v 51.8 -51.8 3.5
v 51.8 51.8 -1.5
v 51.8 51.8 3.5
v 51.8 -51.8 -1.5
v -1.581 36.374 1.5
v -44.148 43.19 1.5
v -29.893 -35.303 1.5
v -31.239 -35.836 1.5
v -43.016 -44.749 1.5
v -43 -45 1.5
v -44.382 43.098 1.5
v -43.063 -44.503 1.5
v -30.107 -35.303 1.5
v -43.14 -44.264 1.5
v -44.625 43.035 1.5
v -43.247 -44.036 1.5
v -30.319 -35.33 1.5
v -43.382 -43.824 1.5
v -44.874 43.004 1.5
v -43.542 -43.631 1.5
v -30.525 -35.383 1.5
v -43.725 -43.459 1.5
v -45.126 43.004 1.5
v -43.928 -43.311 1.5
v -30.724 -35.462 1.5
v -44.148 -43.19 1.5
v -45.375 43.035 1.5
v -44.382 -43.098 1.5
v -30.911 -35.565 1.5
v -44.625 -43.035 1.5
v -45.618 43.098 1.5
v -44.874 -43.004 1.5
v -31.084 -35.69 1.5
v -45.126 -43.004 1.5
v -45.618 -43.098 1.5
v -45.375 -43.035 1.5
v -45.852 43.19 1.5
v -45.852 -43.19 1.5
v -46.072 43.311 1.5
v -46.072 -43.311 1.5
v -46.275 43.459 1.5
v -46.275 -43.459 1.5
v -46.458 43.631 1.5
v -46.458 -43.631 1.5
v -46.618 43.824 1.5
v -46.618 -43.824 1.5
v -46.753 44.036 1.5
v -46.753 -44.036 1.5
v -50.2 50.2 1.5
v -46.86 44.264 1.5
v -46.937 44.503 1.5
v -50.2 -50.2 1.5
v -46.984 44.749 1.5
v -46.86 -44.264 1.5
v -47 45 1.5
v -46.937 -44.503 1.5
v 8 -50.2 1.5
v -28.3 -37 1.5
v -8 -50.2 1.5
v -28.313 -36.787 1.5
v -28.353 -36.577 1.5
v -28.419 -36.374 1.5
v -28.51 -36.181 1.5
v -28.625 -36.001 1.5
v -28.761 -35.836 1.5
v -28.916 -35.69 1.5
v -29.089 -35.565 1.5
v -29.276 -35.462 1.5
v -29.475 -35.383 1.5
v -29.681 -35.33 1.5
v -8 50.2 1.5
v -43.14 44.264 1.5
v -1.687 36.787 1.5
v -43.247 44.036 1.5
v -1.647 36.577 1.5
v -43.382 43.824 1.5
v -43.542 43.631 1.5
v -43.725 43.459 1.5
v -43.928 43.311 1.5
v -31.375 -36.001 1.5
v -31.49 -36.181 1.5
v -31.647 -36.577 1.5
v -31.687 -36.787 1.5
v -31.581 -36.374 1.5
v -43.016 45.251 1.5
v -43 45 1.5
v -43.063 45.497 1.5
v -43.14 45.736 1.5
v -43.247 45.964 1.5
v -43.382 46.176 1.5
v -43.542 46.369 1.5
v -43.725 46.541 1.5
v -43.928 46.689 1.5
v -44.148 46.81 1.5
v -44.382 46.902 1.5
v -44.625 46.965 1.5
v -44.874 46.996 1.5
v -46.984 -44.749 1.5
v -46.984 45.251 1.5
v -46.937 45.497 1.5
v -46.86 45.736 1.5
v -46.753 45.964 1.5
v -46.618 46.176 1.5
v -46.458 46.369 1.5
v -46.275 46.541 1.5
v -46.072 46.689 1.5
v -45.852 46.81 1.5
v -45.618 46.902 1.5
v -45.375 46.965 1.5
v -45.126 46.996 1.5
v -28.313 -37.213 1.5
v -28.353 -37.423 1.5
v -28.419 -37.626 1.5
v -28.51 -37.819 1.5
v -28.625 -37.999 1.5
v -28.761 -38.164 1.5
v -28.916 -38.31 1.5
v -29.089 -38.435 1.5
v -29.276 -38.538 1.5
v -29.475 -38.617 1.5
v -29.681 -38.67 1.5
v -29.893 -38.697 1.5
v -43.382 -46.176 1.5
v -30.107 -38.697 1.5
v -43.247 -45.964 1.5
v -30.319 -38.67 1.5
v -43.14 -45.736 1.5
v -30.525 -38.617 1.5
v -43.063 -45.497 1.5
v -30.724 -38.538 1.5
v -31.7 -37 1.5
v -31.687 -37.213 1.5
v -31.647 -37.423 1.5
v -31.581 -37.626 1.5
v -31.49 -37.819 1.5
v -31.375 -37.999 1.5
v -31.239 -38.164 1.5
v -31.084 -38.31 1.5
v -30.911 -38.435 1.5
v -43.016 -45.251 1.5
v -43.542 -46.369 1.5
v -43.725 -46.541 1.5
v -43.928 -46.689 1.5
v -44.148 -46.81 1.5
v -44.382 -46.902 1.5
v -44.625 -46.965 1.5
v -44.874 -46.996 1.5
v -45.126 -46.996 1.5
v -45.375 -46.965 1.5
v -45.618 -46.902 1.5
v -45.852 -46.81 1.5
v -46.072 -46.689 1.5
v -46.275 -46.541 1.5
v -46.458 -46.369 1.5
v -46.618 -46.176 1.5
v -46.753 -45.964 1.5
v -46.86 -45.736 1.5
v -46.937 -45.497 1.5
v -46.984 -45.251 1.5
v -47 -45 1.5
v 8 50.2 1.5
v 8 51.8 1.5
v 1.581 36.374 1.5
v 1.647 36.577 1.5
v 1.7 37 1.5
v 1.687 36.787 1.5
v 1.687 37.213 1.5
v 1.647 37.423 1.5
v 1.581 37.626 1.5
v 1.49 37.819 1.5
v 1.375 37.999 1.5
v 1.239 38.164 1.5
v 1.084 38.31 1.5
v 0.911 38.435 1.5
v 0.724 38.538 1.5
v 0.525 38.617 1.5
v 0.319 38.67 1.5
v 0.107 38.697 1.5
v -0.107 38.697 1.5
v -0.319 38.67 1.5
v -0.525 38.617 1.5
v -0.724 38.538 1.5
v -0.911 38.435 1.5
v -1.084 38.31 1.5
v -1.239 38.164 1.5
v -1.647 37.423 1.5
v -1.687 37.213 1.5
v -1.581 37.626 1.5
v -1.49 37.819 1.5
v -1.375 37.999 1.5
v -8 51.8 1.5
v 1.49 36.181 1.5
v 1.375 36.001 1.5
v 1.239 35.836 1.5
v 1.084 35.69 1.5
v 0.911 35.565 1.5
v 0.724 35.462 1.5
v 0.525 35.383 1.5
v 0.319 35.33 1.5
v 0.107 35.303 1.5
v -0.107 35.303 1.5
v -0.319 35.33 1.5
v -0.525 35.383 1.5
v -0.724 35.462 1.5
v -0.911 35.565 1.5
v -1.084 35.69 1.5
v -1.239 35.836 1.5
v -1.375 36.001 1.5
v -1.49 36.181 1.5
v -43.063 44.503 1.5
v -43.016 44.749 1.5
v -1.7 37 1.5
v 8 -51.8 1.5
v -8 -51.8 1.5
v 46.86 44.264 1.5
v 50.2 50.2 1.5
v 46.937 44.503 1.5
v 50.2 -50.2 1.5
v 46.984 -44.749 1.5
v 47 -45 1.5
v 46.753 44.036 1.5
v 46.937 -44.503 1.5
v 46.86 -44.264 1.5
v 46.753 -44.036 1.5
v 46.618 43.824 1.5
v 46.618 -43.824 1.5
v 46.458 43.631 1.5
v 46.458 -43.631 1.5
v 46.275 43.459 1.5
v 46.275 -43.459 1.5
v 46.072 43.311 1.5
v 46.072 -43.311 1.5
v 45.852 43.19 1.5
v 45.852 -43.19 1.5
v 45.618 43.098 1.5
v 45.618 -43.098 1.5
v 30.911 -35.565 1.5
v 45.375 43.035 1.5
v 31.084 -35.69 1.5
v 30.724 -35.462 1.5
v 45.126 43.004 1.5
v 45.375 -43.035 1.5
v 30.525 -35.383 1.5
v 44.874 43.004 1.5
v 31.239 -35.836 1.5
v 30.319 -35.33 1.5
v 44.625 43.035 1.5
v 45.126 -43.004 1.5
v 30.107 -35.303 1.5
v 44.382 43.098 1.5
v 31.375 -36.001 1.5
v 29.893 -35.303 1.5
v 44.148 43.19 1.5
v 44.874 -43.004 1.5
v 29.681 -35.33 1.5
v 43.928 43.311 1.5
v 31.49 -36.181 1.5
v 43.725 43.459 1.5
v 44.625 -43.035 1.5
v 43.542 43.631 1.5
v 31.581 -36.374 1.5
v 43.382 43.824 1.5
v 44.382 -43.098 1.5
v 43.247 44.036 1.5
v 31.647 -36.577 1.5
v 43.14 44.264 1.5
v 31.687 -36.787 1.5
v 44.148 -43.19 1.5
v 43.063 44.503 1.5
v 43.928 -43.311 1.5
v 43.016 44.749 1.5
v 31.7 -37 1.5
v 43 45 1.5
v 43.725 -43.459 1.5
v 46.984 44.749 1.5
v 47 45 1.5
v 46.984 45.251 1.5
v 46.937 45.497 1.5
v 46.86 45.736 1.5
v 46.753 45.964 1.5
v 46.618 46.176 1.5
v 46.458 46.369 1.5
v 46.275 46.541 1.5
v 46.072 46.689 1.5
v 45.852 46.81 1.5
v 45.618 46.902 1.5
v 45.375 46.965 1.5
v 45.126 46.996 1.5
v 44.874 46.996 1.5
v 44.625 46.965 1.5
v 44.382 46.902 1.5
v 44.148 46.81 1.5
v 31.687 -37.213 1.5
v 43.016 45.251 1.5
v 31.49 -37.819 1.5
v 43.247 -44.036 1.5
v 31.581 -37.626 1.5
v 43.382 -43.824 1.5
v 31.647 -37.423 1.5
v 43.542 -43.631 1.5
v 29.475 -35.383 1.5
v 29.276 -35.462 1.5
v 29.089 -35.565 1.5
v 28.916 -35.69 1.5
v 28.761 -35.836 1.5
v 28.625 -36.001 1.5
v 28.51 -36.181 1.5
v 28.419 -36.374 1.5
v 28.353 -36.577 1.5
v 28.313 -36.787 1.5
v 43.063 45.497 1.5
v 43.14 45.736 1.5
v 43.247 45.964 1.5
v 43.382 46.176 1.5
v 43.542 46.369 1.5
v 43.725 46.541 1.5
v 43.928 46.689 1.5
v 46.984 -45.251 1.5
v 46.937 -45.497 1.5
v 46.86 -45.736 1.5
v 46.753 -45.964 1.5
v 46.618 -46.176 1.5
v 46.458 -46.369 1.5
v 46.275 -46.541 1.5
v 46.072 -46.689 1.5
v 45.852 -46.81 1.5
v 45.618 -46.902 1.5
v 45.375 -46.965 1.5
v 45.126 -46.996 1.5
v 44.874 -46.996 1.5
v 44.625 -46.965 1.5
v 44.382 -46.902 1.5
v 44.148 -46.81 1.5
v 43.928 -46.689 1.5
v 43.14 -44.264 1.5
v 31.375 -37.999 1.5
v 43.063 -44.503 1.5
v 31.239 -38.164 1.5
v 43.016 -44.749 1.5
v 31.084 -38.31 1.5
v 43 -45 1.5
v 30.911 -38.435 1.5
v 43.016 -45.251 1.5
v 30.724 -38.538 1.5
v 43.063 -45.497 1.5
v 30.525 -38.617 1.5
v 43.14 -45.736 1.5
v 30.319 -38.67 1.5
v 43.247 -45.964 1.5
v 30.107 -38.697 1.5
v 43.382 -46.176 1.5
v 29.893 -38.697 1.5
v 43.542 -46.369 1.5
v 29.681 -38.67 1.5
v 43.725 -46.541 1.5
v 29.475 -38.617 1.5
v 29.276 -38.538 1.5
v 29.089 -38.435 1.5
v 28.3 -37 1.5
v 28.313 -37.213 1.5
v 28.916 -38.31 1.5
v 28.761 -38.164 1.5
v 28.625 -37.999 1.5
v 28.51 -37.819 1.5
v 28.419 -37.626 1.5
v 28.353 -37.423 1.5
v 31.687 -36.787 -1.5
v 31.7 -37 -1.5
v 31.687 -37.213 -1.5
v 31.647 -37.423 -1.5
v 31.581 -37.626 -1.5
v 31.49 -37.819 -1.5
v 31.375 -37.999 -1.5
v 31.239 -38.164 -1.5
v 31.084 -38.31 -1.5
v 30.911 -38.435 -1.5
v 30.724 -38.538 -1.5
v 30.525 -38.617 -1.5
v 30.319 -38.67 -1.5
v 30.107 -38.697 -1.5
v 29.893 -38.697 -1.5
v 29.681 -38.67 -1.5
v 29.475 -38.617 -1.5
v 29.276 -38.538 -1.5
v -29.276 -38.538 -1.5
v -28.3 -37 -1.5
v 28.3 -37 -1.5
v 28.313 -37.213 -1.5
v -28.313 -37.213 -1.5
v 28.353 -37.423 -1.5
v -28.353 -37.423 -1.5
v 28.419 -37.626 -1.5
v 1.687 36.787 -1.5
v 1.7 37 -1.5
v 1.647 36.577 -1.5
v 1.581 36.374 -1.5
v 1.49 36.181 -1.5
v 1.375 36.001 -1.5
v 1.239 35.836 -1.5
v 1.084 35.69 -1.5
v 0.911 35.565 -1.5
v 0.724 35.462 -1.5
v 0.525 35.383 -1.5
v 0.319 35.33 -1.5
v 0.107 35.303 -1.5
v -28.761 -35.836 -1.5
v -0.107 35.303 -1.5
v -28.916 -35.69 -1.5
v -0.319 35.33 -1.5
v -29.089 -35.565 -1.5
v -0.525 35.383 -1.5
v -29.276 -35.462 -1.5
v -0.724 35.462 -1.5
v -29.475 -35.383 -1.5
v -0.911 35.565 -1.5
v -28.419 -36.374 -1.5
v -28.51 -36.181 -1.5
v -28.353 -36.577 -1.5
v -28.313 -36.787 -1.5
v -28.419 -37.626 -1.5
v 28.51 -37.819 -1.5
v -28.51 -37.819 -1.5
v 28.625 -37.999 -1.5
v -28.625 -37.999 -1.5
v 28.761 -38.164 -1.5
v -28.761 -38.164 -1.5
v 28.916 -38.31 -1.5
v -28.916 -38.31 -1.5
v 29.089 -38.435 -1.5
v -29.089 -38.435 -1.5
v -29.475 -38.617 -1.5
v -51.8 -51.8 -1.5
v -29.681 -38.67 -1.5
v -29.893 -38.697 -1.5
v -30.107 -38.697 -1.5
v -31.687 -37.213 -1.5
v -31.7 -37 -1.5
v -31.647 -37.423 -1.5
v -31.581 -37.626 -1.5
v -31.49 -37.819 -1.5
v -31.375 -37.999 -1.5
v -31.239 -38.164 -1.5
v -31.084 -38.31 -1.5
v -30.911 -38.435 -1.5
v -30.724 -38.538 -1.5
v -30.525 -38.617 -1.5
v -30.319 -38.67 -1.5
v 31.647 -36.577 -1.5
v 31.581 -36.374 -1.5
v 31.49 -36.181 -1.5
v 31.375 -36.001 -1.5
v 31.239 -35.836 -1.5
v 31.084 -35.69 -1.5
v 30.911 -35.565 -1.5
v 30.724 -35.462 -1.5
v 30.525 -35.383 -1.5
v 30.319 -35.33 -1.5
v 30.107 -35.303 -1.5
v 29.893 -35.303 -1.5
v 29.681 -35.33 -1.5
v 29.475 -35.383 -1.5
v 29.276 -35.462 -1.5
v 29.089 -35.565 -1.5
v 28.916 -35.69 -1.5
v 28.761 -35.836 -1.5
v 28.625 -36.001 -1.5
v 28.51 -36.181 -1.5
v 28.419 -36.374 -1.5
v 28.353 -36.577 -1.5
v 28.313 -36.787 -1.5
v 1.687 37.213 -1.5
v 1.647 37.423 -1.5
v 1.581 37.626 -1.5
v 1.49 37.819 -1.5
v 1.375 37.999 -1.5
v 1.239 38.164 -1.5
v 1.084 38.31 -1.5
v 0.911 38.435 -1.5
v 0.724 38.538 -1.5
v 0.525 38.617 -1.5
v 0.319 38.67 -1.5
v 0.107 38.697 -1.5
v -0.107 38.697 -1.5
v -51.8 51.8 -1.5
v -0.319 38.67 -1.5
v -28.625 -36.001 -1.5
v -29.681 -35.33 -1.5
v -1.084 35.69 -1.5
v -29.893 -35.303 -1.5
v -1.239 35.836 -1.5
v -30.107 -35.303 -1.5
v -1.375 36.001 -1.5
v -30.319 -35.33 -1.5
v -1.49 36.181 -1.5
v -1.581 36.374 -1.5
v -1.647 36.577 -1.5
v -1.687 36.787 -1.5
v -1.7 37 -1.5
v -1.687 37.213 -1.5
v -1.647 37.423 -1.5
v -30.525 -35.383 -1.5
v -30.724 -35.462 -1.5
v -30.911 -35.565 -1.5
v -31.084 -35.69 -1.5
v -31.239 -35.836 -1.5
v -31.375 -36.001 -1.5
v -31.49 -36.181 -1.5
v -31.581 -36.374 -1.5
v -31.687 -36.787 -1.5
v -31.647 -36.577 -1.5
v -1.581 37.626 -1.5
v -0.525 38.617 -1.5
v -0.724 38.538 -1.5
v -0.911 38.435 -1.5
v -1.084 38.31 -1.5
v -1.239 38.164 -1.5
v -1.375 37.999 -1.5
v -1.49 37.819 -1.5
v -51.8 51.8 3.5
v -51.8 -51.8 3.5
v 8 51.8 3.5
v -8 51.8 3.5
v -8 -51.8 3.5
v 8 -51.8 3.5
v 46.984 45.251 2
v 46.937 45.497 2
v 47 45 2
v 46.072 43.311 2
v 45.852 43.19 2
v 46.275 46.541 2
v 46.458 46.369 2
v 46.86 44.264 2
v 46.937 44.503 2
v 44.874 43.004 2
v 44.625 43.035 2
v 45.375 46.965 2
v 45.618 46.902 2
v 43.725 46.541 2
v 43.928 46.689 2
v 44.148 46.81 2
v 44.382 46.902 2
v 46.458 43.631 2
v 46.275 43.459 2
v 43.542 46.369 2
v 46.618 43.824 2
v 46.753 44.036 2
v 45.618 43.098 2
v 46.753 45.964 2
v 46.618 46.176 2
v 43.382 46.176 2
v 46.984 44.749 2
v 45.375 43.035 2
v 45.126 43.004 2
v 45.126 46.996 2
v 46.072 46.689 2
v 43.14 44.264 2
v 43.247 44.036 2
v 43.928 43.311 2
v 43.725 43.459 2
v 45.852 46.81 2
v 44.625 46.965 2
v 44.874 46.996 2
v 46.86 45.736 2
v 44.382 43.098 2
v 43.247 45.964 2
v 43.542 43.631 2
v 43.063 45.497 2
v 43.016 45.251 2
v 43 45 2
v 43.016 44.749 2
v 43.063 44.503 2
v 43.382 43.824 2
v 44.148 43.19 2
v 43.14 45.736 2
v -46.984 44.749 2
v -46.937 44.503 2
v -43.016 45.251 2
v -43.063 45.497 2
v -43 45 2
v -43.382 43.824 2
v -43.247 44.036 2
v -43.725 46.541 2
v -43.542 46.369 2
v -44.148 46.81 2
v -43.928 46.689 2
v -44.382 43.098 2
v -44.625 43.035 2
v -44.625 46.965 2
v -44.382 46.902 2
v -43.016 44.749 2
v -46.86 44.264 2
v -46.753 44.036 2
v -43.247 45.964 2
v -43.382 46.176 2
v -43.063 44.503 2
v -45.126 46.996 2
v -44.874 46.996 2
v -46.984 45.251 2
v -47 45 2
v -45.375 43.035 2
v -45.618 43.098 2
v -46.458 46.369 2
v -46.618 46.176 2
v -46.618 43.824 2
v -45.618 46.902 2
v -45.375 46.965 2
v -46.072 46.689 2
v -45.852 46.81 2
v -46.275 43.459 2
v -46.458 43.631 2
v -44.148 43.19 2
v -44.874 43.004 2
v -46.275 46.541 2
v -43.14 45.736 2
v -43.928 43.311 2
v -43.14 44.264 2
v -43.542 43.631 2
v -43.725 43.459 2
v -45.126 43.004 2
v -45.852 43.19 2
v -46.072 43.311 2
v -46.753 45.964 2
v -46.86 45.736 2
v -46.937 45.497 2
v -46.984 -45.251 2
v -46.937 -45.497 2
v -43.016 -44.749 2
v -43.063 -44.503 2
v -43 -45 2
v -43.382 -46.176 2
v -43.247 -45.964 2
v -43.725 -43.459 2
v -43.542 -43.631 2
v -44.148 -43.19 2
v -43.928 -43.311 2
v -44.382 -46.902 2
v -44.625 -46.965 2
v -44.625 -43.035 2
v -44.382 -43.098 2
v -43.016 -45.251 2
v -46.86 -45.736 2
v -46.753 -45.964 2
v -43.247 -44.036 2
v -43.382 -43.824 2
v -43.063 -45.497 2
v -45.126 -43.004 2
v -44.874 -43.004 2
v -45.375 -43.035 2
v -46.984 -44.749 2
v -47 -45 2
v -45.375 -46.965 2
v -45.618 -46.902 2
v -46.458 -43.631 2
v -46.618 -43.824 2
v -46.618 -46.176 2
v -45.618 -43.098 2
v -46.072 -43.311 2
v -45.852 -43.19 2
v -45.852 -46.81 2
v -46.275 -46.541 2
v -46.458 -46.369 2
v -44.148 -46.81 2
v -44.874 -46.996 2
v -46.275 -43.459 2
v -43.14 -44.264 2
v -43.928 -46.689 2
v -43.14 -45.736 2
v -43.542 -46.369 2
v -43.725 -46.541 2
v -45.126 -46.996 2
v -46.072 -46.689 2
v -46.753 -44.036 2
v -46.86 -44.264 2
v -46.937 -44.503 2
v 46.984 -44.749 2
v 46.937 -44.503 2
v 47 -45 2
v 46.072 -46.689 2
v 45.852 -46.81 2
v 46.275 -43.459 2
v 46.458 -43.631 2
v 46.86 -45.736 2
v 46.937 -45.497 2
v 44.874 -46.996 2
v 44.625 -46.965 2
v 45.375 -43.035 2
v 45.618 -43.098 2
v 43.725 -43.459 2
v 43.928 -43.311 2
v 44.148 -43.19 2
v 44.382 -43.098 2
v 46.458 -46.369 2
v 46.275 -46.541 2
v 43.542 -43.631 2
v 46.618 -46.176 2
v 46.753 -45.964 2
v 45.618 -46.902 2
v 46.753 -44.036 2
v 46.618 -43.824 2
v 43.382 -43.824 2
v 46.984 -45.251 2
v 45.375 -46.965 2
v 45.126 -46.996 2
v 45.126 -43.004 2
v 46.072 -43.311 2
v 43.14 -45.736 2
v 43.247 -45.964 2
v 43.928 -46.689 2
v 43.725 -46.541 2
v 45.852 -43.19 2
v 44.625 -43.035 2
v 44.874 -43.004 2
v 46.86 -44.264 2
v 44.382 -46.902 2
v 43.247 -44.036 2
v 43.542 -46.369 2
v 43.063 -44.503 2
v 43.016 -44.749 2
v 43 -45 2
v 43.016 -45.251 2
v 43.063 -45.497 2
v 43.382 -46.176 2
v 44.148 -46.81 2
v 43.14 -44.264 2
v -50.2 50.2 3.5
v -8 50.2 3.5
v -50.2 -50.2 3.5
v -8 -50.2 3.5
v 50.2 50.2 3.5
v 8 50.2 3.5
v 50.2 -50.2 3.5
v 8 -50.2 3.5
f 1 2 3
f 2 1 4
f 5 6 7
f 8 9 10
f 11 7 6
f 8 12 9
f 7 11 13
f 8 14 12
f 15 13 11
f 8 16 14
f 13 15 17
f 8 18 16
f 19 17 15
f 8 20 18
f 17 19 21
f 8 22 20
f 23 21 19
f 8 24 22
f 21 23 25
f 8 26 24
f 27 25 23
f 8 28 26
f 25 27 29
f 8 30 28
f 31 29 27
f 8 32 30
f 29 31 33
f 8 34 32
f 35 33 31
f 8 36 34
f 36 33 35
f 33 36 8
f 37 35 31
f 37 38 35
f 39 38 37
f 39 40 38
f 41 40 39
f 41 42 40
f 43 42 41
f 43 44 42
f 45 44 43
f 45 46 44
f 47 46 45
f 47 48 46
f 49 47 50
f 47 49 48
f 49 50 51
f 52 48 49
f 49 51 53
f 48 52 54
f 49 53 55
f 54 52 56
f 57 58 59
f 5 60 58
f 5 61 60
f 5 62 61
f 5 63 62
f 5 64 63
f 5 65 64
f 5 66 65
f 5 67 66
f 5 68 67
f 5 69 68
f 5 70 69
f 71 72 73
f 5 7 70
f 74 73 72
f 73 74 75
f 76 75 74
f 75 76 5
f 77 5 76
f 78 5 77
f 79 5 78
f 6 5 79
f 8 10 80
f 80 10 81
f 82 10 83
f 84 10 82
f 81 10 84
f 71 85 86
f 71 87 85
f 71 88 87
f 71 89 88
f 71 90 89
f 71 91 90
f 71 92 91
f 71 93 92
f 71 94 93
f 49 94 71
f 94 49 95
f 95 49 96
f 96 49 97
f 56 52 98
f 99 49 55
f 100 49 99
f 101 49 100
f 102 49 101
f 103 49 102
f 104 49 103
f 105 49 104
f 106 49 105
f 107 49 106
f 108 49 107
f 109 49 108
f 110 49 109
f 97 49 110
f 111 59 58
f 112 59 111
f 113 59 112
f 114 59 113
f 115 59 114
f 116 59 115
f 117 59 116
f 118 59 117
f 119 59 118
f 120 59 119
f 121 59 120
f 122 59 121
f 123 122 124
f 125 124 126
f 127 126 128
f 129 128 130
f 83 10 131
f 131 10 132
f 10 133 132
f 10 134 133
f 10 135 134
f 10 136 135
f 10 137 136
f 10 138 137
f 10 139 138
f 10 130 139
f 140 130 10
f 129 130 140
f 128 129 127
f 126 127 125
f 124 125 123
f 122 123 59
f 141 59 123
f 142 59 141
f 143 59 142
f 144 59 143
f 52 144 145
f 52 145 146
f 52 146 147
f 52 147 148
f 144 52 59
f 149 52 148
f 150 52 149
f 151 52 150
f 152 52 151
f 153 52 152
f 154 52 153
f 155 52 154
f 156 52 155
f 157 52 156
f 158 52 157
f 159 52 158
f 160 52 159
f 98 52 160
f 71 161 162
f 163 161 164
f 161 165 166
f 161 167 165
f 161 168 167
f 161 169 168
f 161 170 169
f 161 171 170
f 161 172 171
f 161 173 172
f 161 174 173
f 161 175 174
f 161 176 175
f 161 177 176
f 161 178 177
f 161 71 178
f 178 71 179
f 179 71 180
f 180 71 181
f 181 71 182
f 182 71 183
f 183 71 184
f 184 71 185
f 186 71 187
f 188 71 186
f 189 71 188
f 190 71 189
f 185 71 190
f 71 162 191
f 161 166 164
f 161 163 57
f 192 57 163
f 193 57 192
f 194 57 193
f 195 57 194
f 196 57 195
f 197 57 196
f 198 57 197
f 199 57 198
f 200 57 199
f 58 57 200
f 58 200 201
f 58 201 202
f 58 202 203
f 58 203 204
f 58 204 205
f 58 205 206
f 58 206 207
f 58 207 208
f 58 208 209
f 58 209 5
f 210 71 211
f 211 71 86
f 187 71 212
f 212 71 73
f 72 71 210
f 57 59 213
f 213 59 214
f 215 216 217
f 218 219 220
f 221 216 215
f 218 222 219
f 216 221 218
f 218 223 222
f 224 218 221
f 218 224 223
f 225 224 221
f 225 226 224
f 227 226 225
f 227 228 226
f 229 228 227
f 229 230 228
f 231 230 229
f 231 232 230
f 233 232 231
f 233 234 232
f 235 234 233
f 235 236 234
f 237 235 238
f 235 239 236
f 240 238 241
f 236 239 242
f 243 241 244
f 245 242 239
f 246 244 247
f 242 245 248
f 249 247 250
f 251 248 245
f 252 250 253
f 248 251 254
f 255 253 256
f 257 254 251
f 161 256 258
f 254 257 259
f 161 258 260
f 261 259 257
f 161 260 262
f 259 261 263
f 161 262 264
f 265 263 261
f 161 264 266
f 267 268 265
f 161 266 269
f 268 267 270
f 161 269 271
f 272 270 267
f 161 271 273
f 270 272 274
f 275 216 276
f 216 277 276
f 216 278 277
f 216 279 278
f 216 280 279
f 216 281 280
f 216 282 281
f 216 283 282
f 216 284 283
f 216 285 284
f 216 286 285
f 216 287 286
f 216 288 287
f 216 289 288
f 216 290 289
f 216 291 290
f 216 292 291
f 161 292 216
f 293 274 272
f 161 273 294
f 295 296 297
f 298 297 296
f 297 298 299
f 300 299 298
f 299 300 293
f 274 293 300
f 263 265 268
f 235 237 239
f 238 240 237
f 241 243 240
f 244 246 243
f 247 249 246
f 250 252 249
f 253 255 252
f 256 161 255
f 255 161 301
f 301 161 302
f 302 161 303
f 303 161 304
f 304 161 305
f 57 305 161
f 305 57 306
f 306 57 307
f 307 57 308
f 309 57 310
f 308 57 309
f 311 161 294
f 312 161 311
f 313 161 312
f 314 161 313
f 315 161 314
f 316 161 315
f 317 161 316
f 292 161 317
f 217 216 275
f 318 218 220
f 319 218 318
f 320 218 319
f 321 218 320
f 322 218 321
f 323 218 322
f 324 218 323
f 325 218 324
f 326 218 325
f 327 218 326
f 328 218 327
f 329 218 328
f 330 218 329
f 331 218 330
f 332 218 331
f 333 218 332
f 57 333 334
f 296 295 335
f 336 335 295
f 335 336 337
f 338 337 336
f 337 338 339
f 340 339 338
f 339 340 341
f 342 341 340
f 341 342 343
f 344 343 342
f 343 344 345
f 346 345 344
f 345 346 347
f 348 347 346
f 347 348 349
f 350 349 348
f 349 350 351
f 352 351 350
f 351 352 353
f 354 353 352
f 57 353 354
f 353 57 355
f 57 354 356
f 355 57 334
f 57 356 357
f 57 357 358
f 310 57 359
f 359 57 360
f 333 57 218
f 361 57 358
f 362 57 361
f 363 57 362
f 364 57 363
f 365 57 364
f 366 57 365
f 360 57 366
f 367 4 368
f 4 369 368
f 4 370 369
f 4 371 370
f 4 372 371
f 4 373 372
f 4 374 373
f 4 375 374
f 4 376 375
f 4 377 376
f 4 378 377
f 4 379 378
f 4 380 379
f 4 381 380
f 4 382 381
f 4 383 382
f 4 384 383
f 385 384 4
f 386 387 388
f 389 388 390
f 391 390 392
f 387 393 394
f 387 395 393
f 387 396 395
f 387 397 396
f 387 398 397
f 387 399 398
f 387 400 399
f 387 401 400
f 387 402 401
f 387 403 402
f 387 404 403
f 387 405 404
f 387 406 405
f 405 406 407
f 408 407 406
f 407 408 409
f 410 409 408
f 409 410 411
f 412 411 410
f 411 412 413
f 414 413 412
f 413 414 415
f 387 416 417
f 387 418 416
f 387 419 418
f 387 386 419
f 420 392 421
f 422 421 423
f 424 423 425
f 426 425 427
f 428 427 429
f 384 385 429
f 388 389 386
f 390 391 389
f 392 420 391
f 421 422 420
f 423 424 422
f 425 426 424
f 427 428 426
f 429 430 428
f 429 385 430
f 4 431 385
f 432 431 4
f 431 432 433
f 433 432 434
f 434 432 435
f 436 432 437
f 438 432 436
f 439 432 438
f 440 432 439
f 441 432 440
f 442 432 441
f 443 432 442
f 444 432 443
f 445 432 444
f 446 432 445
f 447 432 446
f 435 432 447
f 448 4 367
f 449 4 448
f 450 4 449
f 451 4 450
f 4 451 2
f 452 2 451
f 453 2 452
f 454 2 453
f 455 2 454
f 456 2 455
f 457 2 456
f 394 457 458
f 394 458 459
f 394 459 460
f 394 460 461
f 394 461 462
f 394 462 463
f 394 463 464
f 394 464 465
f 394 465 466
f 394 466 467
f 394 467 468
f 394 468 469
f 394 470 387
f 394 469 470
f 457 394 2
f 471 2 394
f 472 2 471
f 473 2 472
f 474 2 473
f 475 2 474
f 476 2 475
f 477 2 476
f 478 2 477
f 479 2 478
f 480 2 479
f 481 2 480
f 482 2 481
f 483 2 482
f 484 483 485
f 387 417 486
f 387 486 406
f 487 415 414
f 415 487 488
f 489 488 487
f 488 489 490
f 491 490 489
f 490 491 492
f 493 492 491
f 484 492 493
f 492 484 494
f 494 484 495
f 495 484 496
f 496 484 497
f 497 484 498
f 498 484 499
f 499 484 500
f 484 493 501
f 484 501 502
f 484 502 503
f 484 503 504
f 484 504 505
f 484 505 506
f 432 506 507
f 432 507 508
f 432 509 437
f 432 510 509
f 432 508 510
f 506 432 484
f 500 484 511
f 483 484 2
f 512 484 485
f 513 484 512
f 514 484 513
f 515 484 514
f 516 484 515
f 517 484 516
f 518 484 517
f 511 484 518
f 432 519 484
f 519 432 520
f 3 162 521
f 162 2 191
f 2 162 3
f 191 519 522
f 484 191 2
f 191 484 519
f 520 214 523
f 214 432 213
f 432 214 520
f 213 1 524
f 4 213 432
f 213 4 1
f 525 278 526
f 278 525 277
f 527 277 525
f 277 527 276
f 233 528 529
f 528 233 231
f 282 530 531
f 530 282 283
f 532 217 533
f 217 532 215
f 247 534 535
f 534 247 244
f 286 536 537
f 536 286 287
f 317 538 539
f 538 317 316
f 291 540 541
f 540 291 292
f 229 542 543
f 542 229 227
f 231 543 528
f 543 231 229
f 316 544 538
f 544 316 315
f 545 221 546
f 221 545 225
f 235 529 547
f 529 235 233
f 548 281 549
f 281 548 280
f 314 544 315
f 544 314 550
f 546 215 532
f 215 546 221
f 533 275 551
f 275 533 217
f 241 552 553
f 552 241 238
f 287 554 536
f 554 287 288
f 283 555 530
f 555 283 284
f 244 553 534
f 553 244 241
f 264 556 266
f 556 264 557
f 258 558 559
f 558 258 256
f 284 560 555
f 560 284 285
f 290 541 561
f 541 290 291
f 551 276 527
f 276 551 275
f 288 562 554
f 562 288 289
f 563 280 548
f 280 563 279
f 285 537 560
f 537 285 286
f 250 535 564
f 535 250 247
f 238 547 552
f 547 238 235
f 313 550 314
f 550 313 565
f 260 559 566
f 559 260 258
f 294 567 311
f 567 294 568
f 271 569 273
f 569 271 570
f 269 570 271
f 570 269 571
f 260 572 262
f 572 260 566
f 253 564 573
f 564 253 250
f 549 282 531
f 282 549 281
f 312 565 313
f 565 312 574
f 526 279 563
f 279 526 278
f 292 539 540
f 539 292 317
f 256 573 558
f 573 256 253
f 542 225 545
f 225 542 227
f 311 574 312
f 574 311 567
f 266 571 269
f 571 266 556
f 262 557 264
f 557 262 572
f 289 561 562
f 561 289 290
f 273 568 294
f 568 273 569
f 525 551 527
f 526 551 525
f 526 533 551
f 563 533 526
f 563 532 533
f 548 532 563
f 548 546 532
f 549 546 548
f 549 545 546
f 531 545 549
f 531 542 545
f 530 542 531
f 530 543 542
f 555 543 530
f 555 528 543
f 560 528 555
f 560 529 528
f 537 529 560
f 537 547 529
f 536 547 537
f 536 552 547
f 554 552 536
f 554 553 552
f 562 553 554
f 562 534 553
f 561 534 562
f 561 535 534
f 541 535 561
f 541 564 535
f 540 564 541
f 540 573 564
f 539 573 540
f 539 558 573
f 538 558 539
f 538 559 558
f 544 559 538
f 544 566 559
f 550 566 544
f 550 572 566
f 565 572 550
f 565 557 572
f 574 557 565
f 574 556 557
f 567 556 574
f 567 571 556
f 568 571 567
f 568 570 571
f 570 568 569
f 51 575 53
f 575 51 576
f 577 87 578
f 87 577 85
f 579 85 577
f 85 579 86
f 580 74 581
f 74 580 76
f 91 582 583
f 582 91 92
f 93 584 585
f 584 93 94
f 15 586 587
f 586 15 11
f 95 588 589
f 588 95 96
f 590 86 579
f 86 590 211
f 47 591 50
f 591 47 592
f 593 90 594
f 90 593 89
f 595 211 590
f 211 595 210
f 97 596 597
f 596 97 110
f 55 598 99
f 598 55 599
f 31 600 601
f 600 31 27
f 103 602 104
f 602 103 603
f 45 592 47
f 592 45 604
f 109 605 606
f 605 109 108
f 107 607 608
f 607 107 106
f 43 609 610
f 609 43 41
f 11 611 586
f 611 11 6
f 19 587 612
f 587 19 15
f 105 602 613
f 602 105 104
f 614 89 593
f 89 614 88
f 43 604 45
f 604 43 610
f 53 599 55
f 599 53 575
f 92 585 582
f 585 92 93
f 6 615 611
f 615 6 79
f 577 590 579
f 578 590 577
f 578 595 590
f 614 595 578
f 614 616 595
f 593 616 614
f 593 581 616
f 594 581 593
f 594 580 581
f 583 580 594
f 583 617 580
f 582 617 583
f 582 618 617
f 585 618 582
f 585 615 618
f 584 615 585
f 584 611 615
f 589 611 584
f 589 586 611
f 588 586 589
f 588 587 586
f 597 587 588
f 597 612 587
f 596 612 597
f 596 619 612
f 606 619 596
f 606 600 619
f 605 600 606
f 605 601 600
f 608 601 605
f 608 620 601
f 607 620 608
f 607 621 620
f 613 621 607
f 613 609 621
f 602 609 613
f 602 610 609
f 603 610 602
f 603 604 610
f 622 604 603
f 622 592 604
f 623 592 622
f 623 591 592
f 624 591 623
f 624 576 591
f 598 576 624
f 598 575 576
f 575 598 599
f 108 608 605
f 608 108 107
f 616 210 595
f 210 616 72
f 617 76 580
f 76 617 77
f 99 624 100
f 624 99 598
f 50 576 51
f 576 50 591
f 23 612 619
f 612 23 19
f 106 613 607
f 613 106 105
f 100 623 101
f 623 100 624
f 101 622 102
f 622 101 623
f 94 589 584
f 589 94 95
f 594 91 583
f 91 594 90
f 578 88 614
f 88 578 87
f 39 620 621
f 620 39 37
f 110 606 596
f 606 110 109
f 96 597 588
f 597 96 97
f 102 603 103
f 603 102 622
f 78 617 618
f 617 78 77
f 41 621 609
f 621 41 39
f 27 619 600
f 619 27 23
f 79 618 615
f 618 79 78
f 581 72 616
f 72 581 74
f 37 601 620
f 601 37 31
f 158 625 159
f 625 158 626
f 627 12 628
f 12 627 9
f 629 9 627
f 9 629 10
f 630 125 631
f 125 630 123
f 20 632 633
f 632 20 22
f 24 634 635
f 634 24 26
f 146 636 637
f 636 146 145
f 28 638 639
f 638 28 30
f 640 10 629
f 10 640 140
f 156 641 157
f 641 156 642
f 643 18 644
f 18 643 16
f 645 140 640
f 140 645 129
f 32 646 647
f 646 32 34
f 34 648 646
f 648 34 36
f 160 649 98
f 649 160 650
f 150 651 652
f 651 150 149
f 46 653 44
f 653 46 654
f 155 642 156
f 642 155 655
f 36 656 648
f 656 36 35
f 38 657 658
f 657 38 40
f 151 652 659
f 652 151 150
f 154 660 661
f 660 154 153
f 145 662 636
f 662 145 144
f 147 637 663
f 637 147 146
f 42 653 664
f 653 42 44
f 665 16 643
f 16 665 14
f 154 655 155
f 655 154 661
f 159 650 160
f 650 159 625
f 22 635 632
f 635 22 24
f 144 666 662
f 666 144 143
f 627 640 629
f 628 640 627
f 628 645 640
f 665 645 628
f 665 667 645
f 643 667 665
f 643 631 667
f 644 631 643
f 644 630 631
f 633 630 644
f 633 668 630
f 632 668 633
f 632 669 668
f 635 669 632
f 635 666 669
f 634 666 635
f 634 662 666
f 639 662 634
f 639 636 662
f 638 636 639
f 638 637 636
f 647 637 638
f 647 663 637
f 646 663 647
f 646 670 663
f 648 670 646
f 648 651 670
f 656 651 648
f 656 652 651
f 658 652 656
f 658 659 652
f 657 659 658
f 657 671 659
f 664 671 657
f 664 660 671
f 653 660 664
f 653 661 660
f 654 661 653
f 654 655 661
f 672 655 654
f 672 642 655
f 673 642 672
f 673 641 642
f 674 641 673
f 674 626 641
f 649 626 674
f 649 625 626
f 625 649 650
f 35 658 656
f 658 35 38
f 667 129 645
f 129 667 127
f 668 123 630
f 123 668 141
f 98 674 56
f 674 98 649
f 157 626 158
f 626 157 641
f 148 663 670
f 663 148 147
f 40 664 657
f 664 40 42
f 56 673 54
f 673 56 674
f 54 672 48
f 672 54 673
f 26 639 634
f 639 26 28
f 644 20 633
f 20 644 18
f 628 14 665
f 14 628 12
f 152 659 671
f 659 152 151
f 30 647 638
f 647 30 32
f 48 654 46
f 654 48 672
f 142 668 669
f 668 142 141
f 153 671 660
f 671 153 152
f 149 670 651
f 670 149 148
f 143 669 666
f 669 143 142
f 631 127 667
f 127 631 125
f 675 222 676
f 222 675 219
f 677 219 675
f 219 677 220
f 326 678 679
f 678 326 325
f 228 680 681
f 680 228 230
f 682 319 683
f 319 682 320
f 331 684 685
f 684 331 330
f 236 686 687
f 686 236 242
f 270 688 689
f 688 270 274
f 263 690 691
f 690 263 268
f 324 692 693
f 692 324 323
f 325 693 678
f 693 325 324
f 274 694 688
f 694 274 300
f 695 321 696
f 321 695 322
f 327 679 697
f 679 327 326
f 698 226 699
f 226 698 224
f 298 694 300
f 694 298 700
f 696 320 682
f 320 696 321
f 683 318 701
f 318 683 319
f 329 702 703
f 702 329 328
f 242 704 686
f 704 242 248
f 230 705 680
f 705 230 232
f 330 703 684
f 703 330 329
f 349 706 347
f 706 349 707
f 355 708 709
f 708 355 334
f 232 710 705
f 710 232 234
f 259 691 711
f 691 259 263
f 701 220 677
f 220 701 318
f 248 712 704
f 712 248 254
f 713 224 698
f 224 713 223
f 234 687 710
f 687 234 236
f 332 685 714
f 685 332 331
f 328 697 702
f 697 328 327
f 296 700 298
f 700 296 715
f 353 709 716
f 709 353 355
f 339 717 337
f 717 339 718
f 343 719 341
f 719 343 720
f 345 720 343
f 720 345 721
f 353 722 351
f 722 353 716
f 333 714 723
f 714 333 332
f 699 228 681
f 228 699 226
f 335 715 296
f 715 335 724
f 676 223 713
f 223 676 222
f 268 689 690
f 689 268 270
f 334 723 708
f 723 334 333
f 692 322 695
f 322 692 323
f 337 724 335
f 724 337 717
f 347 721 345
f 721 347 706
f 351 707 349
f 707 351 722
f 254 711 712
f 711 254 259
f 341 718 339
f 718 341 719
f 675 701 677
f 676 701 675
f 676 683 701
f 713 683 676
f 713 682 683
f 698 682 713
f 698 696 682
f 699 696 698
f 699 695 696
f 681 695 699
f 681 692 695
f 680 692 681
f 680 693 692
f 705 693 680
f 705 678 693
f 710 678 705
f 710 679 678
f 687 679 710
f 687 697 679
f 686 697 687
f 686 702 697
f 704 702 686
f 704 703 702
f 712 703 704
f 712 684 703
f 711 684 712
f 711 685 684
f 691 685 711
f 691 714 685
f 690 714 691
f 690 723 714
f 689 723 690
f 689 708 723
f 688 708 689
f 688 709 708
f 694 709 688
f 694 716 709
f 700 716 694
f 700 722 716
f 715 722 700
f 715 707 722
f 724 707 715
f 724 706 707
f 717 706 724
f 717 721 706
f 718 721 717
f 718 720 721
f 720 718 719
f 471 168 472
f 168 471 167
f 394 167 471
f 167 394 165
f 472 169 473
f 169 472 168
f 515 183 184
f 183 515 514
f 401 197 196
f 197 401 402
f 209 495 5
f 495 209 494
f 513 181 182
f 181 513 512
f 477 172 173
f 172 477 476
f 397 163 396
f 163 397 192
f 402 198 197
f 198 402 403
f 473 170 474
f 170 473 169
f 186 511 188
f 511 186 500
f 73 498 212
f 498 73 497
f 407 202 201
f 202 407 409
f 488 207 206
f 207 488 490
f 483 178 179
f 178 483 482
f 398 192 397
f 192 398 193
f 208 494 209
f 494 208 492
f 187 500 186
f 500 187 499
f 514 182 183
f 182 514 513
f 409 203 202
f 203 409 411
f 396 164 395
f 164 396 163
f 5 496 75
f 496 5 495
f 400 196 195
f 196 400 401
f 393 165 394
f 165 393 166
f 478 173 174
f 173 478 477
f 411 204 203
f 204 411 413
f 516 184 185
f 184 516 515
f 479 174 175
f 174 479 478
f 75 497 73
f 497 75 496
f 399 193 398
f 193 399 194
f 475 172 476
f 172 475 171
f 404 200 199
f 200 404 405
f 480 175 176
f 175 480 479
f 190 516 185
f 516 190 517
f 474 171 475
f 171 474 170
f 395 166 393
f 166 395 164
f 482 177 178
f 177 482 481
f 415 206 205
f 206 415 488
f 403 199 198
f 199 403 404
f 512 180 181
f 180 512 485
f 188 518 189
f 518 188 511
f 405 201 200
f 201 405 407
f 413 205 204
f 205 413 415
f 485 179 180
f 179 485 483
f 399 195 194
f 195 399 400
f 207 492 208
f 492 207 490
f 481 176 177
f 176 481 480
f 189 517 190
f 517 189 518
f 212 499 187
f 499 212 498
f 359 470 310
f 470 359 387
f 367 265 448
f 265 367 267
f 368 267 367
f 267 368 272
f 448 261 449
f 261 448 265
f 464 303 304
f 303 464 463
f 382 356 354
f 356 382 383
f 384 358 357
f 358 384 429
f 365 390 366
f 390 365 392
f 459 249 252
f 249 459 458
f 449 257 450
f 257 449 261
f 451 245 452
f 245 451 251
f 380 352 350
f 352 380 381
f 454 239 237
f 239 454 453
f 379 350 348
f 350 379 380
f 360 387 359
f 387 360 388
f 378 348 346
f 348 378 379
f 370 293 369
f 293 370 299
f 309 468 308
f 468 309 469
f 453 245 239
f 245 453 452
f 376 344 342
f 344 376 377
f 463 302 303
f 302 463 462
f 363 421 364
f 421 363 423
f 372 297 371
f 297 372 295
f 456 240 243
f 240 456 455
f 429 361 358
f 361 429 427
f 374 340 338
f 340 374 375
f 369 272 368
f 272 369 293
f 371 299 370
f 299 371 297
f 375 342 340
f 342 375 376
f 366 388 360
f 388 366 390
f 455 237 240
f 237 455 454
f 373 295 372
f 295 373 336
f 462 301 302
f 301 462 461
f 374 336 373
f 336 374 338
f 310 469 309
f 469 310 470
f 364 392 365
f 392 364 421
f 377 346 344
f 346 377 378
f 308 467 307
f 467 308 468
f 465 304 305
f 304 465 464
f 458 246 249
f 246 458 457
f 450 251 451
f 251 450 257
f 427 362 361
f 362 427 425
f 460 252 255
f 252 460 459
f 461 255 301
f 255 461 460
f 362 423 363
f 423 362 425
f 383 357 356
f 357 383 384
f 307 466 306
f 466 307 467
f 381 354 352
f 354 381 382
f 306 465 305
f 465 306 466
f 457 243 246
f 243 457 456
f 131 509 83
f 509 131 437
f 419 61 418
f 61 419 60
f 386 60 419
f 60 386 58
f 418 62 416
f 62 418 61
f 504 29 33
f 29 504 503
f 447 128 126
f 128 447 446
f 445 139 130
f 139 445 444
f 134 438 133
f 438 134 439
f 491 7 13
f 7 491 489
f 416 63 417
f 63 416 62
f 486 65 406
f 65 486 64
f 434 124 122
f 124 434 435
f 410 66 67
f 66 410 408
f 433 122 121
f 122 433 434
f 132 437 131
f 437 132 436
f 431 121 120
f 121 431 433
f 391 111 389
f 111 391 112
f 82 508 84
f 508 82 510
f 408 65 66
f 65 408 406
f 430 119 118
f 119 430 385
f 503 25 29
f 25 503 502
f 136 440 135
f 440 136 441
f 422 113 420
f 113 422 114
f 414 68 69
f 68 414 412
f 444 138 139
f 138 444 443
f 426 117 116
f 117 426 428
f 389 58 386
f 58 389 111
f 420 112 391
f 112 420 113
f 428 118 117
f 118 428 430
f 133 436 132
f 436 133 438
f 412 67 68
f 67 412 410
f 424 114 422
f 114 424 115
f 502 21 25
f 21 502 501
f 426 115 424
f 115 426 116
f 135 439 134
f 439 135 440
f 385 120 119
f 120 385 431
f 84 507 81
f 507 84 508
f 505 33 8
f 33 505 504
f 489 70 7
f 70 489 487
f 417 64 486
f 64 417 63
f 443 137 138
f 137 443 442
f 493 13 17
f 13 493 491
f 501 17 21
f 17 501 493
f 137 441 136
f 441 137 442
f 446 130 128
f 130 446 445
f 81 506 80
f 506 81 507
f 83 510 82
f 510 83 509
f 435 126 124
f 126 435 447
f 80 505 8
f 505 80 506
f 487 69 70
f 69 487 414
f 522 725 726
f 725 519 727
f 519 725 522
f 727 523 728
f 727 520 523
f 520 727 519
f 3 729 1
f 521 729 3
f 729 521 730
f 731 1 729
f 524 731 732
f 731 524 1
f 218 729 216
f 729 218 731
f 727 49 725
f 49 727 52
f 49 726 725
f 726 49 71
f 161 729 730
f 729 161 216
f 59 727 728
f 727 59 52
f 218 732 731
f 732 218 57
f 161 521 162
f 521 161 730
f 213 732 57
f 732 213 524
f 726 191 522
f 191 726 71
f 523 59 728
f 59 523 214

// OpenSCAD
// 3Dtje buildplate holder

plate_inner_dimension = 100.4;
plate_border = 1.6;
M3_tolerance = 0.2;

// don't touch from here!
plate_outer_dimension = plate_inner_dimension + 2*plate_border;
M3_diameter = 1.5 + M3_tolerance;

difference() {
    union() {
        // groundplate
        cube([plate_outer_dimension, plate_outer_dimension, 3], true); 
        // mounting bumbers to level buildplate on 4 points
        translate([45, 45, 1]) cylinder(2, 2, 2, true, $fn = 50);
        translate([-45, 45, 1]) cylinder(2, 2, 2, true, $fn = 50);
        translate([-45, -45, 1]) cylinder(2, 2, 2, true, $fn = 50);
        translate([45, -45, 1]) cylinder(2, 2, 2, true, $fn = 50);
    }
 
    // 3 holes
    translate([0, 37, 0]) cylinder(10, M3_diameter, M3_diameter, true, $fn = 50);
    translate([30, -37, 0]) cylinder(10, M3_diameter, M3_diameter, true, $fn = 50);
    translate([-30, -37, 0]) cylinder(10, M3_diameter, M3_diameter, true, $fn = 50);
}
 
 
translate([0, 0, 2]) 
    // add 2 access areas from front and back to the buildplate
    difference() {
        // mountplate
        difference() {
            cube([plate_outer_dimension, plate_outer_dimension, 3], true);
            cube([plate_inner_dimension, plate_inner_dimension, 5], true);
        }
        
        cube([16, plate_outer_dimension*1.5, 10], true);
    }
